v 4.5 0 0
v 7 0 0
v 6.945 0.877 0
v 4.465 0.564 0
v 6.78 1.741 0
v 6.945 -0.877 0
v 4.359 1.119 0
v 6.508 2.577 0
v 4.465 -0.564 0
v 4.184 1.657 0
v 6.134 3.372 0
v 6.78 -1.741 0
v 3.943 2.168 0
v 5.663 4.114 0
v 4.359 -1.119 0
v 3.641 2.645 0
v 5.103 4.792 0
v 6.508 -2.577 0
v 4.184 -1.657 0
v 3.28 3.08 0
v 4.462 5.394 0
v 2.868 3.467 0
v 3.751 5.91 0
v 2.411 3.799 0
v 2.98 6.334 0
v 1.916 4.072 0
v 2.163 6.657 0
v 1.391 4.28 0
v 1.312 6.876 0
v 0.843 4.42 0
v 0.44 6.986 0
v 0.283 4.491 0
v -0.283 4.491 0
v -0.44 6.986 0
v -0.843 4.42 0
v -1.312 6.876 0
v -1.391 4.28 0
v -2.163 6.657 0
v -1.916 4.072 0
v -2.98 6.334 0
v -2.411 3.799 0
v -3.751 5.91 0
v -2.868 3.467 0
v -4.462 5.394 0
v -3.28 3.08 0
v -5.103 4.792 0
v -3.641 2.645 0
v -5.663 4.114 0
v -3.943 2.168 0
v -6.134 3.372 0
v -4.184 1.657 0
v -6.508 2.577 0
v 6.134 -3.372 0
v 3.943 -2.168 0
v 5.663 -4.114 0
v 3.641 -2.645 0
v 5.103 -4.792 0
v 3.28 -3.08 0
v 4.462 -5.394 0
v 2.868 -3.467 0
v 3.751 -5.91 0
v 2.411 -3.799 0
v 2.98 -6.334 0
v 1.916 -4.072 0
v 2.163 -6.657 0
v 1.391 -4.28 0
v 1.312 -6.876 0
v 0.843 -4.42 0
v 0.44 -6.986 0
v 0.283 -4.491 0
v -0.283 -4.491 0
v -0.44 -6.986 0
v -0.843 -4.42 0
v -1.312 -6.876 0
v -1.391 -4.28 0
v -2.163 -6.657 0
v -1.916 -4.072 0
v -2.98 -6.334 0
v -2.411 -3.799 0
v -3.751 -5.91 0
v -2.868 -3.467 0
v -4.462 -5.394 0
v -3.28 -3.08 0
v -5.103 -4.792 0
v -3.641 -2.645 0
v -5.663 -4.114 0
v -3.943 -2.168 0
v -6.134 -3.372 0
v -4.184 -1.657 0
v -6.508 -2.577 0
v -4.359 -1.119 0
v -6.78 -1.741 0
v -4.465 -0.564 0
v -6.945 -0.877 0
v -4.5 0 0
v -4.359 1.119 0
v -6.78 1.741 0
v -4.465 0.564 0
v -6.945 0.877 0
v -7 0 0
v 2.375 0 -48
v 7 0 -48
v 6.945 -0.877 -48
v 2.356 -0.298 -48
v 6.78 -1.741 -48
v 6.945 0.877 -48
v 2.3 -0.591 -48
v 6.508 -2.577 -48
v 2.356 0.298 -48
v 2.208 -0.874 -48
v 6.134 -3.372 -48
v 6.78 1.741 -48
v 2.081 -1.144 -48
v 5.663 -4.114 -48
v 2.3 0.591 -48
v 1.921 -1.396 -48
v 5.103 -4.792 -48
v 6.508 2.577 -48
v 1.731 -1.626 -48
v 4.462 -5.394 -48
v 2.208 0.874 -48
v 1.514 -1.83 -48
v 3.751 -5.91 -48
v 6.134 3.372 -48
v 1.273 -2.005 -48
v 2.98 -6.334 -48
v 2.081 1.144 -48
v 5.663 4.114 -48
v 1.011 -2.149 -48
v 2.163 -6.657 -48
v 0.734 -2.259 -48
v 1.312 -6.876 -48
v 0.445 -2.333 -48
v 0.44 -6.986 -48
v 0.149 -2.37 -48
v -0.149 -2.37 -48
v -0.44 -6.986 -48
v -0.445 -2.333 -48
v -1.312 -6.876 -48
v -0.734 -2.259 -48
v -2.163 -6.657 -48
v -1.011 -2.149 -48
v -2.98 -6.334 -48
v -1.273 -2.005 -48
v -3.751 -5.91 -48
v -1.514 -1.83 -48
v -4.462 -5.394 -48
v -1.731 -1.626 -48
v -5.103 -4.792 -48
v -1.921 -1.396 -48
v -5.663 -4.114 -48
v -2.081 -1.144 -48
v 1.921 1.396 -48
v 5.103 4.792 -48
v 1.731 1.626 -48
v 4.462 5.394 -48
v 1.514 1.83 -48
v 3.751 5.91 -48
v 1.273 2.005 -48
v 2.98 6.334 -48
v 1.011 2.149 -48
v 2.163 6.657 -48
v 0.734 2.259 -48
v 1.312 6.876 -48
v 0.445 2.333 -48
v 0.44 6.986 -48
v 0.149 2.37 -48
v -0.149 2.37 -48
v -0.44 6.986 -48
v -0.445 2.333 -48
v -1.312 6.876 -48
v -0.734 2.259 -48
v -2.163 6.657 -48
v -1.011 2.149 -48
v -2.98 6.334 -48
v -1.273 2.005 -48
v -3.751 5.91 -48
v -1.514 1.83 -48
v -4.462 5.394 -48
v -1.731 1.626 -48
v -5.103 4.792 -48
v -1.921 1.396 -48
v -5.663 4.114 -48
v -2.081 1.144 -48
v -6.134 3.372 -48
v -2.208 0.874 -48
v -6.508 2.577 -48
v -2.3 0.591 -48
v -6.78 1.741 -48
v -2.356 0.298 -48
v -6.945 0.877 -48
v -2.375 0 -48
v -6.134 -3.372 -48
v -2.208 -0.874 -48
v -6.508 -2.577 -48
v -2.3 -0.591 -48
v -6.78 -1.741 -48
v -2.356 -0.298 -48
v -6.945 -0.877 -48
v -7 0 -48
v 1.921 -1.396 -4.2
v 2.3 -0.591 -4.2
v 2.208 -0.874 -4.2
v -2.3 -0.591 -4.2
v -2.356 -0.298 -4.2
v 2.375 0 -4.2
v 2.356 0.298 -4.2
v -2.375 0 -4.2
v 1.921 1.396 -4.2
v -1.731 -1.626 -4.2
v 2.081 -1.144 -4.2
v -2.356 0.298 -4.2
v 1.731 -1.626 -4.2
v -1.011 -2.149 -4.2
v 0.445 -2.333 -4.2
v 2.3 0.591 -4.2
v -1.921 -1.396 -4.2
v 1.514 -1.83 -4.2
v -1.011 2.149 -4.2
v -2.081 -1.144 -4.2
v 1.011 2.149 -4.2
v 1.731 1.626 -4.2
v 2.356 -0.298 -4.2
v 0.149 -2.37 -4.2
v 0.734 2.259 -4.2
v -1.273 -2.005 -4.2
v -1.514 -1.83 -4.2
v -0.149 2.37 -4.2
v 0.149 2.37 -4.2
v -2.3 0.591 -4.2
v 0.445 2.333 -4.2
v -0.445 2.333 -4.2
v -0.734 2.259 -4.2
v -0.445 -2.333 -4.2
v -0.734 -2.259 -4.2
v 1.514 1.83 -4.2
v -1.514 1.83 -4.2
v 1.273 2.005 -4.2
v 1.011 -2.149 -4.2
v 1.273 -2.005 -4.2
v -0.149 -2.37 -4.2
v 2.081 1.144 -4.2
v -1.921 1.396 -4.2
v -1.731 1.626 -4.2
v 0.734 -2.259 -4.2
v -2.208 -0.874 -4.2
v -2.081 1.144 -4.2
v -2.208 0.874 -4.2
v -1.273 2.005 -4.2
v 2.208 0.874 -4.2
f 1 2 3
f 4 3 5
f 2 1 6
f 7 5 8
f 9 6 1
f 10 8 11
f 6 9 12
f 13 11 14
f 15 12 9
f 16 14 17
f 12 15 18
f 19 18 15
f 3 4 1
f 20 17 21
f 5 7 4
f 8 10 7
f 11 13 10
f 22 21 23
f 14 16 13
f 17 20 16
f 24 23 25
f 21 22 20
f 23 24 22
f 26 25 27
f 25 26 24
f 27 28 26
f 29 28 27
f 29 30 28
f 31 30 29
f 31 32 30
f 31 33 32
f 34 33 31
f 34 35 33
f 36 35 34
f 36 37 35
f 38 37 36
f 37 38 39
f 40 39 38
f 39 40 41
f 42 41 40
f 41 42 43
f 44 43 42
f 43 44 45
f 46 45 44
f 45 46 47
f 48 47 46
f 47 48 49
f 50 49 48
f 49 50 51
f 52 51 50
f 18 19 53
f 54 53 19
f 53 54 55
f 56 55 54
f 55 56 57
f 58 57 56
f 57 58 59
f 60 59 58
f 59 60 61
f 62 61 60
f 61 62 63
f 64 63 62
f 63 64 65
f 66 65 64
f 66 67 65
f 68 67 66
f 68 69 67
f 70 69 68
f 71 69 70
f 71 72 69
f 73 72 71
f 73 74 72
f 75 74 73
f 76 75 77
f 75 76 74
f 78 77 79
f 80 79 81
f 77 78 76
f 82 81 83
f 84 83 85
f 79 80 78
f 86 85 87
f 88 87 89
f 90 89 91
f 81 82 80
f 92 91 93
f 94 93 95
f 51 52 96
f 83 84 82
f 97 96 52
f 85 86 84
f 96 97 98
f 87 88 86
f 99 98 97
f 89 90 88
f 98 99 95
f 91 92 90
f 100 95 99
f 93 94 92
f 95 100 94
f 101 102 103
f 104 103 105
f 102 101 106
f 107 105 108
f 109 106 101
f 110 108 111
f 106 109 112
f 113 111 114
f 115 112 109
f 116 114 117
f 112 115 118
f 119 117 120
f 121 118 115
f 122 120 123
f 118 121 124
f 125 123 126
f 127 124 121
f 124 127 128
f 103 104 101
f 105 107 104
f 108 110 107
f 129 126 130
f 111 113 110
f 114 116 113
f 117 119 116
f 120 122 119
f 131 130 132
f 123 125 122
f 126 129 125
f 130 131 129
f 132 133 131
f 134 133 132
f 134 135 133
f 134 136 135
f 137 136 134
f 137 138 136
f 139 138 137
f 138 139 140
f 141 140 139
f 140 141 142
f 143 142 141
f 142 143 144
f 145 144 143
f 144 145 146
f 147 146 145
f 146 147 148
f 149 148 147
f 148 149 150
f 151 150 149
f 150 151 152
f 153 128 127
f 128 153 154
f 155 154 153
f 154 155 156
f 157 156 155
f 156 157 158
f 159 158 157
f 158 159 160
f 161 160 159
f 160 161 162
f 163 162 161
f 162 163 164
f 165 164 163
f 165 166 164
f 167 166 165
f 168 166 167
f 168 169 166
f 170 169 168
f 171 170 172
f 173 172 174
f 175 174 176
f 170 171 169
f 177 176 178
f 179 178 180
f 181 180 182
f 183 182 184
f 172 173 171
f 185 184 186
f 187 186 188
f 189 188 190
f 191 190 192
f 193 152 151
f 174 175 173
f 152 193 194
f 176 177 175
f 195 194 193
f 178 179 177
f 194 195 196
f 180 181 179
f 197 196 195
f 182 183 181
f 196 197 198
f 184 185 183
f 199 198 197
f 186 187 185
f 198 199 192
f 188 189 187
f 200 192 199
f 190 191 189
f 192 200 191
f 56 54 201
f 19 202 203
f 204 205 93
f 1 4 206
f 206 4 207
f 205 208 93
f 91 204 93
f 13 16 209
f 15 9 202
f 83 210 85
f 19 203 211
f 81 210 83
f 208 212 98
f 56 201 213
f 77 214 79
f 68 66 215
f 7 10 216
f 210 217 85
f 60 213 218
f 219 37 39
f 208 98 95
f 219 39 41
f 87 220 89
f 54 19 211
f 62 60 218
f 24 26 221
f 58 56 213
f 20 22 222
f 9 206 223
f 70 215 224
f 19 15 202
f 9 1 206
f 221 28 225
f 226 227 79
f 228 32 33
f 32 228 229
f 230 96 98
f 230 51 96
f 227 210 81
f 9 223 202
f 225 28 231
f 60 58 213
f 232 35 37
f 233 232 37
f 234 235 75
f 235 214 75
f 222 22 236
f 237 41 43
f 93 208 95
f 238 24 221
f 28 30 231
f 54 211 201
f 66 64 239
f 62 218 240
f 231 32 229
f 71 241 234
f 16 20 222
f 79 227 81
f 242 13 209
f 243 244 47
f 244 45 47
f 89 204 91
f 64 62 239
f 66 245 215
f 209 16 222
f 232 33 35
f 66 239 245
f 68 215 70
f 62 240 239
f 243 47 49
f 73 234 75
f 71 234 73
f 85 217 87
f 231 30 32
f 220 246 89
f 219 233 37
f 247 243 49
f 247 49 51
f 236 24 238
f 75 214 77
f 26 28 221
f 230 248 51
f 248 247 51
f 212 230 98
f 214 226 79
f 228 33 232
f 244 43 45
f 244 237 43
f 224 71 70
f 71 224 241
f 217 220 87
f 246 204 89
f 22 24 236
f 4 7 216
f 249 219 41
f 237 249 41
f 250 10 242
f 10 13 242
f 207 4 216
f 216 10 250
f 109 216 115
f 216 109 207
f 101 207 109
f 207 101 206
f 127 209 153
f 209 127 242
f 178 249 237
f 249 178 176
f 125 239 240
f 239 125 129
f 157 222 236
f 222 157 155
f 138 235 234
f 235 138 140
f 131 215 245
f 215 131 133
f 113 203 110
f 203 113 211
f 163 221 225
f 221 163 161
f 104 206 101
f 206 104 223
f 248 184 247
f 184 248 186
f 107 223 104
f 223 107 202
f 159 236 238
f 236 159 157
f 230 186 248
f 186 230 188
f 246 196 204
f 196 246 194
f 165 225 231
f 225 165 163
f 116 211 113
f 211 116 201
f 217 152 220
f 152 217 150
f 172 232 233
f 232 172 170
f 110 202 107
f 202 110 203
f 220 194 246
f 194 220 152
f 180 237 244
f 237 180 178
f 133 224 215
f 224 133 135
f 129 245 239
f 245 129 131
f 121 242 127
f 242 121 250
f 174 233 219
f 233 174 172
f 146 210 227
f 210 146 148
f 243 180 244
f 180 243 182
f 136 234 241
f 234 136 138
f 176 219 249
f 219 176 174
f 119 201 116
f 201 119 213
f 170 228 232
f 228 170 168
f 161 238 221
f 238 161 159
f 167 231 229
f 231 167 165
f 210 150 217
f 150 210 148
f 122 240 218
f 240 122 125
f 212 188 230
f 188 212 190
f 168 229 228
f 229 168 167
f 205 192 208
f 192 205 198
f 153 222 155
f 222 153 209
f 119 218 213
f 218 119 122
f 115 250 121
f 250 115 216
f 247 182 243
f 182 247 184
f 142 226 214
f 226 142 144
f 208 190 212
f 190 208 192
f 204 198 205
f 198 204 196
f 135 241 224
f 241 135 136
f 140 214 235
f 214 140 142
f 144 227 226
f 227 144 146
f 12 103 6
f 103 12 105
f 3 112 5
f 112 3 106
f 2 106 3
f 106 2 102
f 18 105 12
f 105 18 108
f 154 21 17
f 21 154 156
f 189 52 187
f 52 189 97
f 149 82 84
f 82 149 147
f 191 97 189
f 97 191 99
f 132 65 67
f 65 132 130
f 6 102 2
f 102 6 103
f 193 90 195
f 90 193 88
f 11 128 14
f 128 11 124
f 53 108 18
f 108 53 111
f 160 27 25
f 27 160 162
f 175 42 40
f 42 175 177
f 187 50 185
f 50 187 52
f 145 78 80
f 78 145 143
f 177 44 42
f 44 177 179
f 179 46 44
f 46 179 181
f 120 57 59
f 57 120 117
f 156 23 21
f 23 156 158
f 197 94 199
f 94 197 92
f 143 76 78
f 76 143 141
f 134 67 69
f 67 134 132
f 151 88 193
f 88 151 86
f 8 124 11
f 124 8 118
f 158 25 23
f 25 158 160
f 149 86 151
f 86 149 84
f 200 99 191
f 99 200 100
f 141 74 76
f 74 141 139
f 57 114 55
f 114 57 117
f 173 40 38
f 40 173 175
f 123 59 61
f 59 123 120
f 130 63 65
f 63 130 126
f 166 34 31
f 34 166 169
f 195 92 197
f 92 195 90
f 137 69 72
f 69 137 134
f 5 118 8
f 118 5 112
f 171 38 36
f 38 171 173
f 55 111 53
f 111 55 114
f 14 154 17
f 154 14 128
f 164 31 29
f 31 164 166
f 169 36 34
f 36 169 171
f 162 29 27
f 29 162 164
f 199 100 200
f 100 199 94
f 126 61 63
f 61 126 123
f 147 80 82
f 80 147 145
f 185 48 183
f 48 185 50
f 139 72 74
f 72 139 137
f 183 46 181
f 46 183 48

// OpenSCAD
$fn = 50;


difference() {
	union() {
		translate(v = [0, 0, -48.0000000000]) {
			cylinder(h = 48, r = 7.0000000000);
		}
		cylinder(h = 0, r = 13.0000000000);
	}
	union() {
		translate(v = [0, 0, 0]) {
			rotate(a = [0, 0, 0]) {
				difference() {
					union() {
						#translate(v = [0, 0, -48.0000000000]) {
							cylinder(h = 48, r = 2.2500000000);
						}
						#translate(v = [0, 0, -4.2000000000]) {
							cylinder(h = 4.2000000000, r = 7.0000000000, r1 = 2.3750000000, r2 = 4.5000000000);
						}
						#translate(v = [0, 0, -48.0000000000]) {
							cylinder(h = 48, r = 2.3750000000);
						}
						#translate(v = [0, 0, -48.0000000000]) {
							cylinder(h = 48, r = 2.2500000000);
						}
					}
					union();
				}
			}
		}
	}
}
